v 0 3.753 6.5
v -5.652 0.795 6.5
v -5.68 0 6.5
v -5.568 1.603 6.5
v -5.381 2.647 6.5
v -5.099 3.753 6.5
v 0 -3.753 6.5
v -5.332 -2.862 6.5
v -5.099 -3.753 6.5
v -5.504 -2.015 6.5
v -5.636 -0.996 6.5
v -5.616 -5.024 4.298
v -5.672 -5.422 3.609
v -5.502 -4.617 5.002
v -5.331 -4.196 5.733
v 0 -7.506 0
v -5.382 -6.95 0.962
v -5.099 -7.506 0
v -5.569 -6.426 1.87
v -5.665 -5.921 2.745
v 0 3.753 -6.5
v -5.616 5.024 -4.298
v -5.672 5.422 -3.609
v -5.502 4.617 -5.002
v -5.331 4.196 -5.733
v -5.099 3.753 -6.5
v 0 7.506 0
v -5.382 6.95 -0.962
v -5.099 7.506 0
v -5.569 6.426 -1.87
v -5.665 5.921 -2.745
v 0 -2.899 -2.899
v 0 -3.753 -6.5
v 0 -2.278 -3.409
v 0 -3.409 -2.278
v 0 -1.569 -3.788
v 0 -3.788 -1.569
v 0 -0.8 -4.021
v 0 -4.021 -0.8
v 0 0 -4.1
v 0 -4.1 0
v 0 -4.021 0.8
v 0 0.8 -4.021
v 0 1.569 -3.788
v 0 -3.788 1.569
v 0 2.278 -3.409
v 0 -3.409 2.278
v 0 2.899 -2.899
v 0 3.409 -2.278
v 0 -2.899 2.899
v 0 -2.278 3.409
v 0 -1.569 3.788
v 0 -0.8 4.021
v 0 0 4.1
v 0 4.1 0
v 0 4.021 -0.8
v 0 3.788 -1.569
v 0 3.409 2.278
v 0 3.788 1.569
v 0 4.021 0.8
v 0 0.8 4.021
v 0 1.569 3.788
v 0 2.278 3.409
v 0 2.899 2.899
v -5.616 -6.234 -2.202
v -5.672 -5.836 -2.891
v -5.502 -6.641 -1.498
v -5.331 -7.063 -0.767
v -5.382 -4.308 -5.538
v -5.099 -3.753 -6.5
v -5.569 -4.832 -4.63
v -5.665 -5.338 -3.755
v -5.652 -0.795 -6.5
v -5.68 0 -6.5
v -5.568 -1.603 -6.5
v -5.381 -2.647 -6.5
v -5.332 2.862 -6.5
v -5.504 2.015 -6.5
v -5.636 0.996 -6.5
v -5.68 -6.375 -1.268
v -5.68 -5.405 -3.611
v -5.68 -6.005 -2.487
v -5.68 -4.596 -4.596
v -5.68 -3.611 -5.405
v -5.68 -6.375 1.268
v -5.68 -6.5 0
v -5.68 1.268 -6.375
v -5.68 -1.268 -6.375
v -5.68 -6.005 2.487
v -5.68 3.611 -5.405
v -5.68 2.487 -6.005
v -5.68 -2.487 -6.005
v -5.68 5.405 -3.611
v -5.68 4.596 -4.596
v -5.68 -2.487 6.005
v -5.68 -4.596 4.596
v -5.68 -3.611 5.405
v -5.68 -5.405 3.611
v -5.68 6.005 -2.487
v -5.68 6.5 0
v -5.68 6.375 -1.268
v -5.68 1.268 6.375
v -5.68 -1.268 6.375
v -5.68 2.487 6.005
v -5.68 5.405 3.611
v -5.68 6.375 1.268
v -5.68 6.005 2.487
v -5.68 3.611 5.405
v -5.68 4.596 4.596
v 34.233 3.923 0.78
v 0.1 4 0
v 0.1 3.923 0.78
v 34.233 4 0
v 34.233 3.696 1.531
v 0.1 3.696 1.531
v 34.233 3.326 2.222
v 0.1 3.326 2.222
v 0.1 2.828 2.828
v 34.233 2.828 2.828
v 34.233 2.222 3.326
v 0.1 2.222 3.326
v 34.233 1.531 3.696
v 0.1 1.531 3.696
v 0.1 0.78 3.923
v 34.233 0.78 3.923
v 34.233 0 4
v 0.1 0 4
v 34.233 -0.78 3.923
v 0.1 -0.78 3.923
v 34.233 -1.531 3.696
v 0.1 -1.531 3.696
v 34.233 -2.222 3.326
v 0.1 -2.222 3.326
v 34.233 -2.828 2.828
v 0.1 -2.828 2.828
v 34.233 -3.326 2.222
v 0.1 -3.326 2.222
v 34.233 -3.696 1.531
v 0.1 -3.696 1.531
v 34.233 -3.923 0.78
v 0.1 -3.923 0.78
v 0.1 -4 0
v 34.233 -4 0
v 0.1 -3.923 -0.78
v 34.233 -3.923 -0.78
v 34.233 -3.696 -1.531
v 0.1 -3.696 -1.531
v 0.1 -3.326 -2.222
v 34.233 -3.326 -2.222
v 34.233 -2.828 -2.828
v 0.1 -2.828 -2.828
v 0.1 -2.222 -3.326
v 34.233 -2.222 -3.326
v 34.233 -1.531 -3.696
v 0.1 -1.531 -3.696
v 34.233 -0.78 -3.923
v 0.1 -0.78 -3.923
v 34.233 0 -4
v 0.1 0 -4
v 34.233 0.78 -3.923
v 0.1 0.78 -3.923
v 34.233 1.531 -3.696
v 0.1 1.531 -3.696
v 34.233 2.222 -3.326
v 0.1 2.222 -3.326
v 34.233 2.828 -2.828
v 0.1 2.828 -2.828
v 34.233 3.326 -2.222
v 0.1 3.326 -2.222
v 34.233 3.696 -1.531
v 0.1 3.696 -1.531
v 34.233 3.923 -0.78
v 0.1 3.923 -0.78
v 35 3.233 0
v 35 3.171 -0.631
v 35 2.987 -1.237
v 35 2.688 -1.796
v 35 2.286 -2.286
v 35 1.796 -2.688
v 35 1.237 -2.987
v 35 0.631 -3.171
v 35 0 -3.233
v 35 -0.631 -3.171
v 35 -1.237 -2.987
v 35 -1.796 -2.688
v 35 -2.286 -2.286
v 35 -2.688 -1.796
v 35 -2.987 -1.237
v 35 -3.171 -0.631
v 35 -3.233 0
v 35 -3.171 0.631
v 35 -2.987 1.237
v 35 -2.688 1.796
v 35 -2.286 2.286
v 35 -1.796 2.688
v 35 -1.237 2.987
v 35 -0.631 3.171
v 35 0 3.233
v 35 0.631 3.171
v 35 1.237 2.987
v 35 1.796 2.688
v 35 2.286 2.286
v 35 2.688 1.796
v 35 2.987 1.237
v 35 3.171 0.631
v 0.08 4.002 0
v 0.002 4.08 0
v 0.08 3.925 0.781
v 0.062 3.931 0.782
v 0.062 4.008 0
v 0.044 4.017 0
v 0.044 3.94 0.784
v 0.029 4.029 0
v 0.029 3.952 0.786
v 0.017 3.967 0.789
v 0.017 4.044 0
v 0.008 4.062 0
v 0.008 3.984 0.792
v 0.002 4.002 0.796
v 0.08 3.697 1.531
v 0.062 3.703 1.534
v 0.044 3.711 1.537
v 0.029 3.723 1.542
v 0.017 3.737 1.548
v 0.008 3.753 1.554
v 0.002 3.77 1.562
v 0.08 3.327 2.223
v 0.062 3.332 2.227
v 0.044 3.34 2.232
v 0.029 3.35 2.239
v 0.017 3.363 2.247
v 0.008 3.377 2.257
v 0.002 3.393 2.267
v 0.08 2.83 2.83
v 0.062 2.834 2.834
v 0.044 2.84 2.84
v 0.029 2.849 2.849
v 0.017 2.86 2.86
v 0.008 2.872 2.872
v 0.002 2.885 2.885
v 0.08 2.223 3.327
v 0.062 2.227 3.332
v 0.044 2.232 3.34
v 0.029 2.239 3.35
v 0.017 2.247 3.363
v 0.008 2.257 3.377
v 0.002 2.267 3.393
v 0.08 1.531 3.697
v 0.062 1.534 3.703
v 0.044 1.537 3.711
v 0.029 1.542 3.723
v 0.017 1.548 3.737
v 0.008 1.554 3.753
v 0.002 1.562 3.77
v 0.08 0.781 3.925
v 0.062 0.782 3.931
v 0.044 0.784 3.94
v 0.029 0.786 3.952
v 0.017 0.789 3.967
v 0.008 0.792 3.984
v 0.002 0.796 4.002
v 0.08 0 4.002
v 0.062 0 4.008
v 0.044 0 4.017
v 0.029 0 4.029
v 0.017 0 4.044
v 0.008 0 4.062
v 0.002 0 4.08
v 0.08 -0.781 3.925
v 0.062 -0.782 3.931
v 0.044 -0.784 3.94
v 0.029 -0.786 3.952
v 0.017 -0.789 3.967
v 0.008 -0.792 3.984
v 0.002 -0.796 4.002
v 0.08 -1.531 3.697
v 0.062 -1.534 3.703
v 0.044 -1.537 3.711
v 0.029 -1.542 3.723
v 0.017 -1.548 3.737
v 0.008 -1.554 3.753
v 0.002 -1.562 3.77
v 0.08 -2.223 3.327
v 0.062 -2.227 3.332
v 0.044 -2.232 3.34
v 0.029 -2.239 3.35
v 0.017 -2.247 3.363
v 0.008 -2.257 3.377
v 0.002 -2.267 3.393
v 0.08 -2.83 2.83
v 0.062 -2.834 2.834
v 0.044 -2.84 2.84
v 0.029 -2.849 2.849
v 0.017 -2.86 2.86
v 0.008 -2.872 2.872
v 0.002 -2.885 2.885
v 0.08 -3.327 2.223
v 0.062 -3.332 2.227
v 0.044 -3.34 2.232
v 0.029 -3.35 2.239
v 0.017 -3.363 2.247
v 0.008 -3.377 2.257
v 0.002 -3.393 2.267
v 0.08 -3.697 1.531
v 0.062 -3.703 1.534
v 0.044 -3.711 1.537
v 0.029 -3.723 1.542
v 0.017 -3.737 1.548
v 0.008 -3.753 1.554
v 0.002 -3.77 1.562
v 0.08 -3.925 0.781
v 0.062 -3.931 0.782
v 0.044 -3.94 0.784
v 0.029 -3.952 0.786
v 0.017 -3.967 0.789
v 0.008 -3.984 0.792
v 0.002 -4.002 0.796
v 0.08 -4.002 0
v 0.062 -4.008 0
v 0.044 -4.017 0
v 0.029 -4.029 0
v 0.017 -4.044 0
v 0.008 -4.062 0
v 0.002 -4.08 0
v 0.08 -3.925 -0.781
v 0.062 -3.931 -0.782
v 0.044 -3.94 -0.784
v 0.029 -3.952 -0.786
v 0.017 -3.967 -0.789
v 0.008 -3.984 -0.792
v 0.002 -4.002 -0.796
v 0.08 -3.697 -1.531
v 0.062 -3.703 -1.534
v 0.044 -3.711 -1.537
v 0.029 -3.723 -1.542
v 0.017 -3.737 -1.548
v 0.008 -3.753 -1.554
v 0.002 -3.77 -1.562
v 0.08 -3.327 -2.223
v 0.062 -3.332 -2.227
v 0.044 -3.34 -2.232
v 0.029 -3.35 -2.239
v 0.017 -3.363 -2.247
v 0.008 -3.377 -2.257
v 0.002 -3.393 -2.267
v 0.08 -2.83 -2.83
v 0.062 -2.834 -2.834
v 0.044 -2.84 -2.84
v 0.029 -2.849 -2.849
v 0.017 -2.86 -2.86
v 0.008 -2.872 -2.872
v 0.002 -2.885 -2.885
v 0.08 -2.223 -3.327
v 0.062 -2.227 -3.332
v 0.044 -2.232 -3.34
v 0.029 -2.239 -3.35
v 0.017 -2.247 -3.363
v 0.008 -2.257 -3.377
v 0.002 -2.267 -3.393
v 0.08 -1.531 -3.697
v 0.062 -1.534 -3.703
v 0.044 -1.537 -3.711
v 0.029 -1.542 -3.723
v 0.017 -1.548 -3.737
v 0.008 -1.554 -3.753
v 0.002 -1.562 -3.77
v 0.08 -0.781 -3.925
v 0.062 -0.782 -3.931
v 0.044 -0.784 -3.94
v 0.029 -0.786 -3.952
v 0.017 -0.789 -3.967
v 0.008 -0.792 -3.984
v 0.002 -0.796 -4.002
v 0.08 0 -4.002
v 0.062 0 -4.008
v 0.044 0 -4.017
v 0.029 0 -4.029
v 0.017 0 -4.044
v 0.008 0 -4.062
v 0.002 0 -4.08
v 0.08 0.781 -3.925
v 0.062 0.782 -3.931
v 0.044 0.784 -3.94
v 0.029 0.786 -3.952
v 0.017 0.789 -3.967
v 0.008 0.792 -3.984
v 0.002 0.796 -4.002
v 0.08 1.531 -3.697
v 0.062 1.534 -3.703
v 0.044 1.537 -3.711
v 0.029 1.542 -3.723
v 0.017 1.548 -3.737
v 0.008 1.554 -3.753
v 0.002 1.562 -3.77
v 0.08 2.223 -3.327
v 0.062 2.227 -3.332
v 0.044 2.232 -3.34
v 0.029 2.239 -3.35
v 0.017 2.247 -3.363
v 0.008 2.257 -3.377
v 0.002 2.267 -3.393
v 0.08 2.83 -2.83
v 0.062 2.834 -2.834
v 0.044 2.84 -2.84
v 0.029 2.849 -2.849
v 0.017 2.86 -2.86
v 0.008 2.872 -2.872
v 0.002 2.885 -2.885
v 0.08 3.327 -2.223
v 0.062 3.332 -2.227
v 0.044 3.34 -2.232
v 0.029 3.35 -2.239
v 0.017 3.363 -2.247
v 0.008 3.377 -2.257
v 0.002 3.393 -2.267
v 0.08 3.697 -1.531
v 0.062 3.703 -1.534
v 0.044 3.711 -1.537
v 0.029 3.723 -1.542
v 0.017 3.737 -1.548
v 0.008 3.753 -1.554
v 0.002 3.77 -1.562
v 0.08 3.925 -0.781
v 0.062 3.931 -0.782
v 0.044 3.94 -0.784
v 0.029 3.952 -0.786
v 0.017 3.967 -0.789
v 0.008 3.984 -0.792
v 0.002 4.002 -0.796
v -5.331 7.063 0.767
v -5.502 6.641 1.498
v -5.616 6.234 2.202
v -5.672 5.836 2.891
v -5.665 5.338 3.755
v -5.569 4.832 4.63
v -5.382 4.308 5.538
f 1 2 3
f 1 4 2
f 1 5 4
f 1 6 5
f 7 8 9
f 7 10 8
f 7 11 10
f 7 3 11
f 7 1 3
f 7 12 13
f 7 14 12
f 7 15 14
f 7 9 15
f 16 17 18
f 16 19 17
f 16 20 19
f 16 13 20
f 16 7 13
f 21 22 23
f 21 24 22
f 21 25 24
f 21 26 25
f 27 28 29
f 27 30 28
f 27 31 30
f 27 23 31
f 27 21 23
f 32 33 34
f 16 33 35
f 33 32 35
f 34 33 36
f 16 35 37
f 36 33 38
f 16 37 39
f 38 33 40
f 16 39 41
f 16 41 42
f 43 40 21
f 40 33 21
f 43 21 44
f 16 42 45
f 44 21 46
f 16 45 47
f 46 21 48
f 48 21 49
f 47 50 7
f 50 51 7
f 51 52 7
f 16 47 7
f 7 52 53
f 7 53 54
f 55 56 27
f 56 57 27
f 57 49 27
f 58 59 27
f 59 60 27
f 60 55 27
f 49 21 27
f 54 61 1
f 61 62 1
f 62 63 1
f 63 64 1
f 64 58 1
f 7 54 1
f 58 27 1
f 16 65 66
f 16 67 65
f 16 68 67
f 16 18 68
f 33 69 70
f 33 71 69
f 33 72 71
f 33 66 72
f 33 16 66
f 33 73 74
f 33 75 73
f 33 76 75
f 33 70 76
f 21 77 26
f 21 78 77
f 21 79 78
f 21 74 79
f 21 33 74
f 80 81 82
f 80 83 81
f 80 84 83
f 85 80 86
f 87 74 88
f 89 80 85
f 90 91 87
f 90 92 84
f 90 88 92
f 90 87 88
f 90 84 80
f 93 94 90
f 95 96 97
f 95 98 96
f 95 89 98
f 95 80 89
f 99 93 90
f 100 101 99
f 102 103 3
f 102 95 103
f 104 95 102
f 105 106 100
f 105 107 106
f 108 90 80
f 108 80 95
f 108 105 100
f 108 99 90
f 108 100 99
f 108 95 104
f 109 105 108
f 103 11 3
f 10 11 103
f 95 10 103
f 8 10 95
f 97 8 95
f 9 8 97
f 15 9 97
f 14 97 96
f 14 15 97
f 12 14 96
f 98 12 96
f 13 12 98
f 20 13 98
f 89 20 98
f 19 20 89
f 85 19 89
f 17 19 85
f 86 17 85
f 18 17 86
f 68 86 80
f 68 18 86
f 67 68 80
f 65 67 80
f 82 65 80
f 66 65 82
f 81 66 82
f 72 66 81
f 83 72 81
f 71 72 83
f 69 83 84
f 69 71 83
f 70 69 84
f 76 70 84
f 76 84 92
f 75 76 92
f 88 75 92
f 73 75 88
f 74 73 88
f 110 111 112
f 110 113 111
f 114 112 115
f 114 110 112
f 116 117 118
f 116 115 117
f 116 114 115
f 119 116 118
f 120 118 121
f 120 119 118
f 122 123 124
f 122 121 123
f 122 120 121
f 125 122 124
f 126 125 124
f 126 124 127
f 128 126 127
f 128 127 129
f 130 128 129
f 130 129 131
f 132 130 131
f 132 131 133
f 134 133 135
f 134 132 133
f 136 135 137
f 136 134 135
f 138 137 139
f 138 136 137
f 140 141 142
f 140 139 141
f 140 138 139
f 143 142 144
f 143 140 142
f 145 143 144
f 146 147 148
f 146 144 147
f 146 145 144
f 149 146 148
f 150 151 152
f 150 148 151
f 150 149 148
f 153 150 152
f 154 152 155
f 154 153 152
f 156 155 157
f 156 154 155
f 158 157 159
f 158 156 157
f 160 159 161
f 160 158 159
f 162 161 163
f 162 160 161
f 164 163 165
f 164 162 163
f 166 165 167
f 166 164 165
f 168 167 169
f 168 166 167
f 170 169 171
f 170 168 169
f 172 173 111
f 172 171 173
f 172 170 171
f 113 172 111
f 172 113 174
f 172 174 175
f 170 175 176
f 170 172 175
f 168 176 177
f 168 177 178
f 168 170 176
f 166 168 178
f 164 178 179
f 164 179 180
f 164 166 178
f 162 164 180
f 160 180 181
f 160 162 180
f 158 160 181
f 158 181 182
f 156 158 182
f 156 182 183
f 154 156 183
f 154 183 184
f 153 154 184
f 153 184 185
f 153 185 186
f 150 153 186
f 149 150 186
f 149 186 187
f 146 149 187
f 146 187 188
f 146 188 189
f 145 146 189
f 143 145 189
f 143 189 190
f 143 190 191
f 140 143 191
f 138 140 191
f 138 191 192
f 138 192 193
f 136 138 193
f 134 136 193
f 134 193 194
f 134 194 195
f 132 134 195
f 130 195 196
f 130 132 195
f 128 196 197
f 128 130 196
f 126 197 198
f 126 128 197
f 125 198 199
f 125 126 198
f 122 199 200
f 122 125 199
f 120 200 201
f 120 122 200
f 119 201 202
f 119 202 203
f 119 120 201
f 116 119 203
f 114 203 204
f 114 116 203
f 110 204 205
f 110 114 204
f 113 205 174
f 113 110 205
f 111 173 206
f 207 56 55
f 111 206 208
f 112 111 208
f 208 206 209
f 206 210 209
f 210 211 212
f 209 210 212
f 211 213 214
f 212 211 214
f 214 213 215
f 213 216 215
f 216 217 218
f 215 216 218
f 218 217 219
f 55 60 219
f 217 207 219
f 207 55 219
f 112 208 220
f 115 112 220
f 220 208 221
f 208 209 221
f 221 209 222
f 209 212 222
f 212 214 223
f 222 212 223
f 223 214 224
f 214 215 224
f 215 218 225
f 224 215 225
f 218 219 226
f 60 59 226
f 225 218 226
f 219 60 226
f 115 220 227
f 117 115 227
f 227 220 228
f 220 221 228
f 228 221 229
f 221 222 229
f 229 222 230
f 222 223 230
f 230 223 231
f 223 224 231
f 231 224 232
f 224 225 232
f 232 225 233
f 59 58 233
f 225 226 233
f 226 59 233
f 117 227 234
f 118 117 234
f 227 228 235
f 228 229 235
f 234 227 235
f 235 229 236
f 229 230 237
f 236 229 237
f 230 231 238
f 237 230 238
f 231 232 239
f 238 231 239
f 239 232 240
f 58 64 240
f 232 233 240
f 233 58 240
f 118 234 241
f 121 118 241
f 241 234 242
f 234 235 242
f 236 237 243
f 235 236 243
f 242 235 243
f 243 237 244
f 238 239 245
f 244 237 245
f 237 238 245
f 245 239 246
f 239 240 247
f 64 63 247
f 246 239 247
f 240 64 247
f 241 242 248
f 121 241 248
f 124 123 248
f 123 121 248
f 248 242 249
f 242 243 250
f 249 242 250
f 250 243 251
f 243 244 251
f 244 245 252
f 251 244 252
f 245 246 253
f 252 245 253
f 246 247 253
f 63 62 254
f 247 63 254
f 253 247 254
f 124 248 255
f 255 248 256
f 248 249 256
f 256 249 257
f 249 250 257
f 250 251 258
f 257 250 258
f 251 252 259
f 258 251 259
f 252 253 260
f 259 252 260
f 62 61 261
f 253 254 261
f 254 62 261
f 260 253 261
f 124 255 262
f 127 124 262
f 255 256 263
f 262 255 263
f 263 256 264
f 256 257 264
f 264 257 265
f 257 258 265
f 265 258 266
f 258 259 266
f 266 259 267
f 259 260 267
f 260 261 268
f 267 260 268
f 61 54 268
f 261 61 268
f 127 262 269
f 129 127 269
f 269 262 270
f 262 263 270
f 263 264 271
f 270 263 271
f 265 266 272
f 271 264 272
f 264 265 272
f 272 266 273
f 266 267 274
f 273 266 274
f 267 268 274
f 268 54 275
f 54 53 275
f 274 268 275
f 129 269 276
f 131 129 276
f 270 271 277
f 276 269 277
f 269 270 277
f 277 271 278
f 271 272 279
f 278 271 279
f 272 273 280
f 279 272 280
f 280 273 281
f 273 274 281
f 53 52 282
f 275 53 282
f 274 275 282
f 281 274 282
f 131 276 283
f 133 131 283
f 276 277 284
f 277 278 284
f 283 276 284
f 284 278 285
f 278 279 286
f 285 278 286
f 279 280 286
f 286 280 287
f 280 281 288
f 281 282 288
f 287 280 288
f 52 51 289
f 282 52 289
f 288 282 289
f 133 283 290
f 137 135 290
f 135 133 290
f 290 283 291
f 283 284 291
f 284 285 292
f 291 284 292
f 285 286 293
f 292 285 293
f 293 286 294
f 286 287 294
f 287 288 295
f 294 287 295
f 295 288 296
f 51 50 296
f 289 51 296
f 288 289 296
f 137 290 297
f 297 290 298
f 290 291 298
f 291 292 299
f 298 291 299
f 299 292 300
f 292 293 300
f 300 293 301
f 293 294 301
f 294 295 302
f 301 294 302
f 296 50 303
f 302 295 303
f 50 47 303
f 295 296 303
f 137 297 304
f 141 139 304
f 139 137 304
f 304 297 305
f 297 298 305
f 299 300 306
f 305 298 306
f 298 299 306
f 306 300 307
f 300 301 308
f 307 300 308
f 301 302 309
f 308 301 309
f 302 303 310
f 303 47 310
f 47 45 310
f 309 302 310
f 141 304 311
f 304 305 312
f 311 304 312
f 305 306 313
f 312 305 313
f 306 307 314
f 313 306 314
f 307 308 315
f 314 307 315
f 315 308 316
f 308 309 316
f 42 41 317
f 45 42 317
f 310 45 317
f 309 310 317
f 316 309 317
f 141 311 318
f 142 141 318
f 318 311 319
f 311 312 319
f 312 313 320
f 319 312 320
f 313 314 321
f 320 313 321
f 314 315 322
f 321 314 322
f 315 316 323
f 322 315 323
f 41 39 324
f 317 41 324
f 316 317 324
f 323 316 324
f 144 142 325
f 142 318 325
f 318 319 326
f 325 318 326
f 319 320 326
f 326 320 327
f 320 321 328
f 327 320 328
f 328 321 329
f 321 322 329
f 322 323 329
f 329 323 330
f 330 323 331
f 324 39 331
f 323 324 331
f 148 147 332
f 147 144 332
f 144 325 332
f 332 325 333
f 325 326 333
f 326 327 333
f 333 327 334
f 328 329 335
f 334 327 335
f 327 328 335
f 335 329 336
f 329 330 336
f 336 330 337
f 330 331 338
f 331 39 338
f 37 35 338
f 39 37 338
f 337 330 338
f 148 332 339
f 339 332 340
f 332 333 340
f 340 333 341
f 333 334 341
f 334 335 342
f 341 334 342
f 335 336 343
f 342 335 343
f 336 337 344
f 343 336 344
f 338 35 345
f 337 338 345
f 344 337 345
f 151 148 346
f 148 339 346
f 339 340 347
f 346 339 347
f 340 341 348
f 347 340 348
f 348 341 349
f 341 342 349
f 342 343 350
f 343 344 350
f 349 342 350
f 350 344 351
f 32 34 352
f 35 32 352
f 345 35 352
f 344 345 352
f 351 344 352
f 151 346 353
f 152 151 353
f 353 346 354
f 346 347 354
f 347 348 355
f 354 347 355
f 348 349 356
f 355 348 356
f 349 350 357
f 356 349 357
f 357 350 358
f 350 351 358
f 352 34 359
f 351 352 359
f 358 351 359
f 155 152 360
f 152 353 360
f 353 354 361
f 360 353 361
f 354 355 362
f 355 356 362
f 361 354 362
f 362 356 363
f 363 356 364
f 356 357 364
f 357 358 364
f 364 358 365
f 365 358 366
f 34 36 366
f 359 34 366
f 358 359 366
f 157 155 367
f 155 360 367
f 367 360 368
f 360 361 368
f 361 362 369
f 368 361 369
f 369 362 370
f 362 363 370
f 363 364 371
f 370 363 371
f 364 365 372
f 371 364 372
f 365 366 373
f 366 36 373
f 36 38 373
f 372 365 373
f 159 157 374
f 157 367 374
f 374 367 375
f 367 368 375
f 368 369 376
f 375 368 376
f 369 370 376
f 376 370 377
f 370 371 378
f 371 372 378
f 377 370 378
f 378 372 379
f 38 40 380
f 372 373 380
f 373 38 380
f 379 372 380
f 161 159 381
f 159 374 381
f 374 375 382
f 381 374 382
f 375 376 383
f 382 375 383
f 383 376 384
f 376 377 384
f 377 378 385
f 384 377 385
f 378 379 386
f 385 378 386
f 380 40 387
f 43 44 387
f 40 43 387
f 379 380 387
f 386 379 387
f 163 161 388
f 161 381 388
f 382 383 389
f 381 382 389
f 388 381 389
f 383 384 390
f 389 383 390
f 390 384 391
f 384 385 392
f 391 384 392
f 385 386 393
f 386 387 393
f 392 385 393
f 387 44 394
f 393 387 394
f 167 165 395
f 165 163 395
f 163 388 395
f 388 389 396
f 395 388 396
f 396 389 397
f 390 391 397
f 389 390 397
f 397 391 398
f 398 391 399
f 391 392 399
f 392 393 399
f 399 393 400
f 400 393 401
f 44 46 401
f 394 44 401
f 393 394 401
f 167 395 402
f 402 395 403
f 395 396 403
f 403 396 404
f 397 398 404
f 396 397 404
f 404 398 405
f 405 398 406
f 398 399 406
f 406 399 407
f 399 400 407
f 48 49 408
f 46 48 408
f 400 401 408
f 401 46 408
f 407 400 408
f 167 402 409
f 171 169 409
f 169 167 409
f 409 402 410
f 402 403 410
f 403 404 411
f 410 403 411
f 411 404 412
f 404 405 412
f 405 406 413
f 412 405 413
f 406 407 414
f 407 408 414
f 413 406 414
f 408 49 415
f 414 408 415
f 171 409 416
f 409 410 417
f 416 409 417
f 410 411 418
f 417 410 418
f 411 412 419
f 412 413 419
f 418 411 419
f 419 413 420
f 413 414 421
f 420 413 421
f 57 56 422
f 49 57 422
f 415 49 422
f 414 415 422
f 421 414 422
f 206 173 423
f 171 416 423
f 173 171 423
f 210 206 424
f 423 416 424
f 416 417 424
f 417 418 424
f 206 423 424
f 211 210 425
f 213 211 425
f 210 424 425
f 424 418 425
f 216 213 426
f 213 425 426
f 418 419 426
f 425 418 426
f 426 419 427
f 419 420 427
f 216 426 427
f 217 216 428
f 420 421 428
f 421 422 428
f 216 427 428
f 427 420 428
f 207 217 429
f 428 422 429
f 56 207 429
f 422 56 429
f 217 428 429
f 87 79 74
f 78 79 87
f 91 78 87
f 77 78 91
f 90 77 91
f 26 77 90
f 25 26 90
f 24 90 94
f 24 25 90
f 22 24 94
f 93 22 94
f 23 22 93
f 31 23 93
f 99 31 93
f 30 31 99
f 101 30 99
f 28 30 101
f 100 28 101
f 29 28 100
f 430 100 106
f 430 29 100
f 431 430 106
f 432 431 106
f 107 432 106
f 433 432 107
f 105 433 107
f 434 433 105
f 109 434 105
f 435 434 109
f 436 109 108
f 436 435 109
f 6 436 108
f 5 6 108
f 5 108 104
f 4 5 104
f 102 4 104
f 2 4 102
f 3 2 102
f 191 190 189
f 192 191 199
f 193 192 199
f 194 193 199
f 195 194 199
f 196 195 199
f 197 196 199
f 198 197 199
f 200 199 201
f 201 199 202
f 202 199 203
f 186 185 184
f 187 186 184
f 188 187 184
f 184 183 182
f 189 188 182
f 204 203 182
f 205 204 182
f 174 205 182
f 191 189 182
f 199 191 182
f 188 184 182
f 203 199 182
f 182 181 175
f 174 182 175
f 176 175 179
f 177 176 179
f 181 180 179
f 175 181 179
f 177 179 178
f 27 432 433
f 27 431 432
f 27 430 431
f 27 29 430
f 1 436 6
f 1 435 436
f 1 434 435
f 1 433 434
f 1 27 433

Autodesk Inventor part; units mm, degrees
ref_plane "YZ Plane" through (0, 0, 0) normal (1, 0, 0) x (0, 1, 0)
ref_plane "XZ Plane" through (0, 0, 0) normal (0, 1, 0) x (-1, 0, 0)
sketch "Sketch1" plane through (0, 0, 0) normal (0, 0, 1) x (1, 0, 0)
  line L0 (0, 4) -> (35, 4)
  line L1 (35, 4) -> (35, 0)
  line L2 (35, 0) -> (0, 0)
  line L3 (-7, 0) -> (42, 0) projected
  line L4 (0, -0.8) -> (0, 4.8) projected
  line L5 (0, 4) -> (0, 0)
  dimension "d2" = 8
  dimension "d59" = 35
revolve "Body" add sketch "Sketch1" angle 360 about axis through (35, 0, 0) along (-1, 0, 0)
sketch "Sketch2" plane through (0, 0, 0) normal (-1, 0, 0) x (0, 0, 1)
  line L0 (0, 7.5056) -> (6.5, 3.7528)
  line L1 (6.5, 3.7528) -> (6.5, -3.7528)
  line L2 (6.5, -3.7528) -> (0, -7.5056)
  line L3 (0, -7.5056) -> (-6.5, -3.7528)
  line L4 (-6.5, -3.7528) -> (-6.5, 3.7528)
  line L5 (-6.5, 3.7528) -> (0, 7.5056)
  line L6 (-9.1, 0) -> (9.1, 0) projected
  line L7 (0, 10.5078) -> (0, -10.5078) projected
  point P0 (0, 0)
  point P1 (0, 0)
  dimension "d11" = 13
extrude "Head" add sketch "Sketch2" along normal blind 5.68
sketch "Sketch4" plane through (0, 0, 0) normal (0, 0, 1) x (1, 0, 0)
  line L0 (-4.9294, 7.8) -> (-5.68, 6.5)
  line L1 (-1.1, 0) -> (-0.234, 0)
  line L2 (-6.7692, 0) -> (0.8552, 0) projected
  line L3 (-5.68, 7.8) -> (-4.9294, 7.8)
  line L4 (-5.68, 6.5) -> (-5.68, 7.8)
  line L5 (0, 9.36) -> (0, -1.56) projected
  dimension "d65" = 13
  dimension "d67" = 30
  dimension "d68" = 15.6
  dimension "d69" = 5.68
revolve "Chamfer1" cut sketch "Sketch4" angle 360 about axis through (-1.1, 0, 0) along (1, 0, 0)
thread "Thread" size "M8x1.25" class "6g" standard "ISO Metric profile" length 22
chamfer "Chamfer2" distance 0.7668 distance2 0.7669 1 edges at (35, -4, 0) measured on face at (35, -0.3588, 0.308)
fillet "Fillet" radius 0.1 1 edges at (0, -4, 0)
ref_plane "Work Plane1" through (1.525, 0, 0) normal (0, 0, 1) x (1, 0, 0)
equation "\"d2\" = GD"
equation "\"d59\" = NLG"
equation "\"d11\" = SW"
equation "\"d3\" = KOH"
equation "\"d15\" = GEL"
equation "\"d6\" = -0.5 * SPD + 0.5 * GD"
equation "\"d71\" = RR"
equation "\"d65\" = SW"
equation "\"d67\" = ANG1"
equation "\"d68\" = 1.2 * SW"
equation "\"d69\" = KOH"
equation "\"NLG\" = 35"
equation "\"GD\" = NND"
equation "\"BDM\" = NND"
equation "\"KOH\" = 5.68"
equation "\"GEL\" = 22"
equation "\"SW\" = 13"
equation "\"SW0\" = SW"
equation "\"SPD\" = NND - 1.2269 * PTC"
equation "\"SD2\" = NND"
equation "\"SD\" = 0"
equation "\"ANG1\" = 30deg"
equation "\"GAL\" = 0.61345 * PTC"
equation "\"GUL\" = 0.61345 * PTC"
equation "\"RR\" = 0.1"
equation "\"RR1\" = 0.4"
equation "\"GD1\" = THREADDIA - 1.2269 * PTC"
equation "\"THREADDIA\" = 8"
equation "\"TOA\" = 30deg"
equation "\"PTC\" = 1.25"
equation "\"KOH1\" = 3.7"
equation "\"NND\" = 8"
equation "\"E0\" = 1.155 * SW"
properties part number "ANSI B18.2.3.5M - M8 x 1.25 x 35" material "Steel, Mild"
